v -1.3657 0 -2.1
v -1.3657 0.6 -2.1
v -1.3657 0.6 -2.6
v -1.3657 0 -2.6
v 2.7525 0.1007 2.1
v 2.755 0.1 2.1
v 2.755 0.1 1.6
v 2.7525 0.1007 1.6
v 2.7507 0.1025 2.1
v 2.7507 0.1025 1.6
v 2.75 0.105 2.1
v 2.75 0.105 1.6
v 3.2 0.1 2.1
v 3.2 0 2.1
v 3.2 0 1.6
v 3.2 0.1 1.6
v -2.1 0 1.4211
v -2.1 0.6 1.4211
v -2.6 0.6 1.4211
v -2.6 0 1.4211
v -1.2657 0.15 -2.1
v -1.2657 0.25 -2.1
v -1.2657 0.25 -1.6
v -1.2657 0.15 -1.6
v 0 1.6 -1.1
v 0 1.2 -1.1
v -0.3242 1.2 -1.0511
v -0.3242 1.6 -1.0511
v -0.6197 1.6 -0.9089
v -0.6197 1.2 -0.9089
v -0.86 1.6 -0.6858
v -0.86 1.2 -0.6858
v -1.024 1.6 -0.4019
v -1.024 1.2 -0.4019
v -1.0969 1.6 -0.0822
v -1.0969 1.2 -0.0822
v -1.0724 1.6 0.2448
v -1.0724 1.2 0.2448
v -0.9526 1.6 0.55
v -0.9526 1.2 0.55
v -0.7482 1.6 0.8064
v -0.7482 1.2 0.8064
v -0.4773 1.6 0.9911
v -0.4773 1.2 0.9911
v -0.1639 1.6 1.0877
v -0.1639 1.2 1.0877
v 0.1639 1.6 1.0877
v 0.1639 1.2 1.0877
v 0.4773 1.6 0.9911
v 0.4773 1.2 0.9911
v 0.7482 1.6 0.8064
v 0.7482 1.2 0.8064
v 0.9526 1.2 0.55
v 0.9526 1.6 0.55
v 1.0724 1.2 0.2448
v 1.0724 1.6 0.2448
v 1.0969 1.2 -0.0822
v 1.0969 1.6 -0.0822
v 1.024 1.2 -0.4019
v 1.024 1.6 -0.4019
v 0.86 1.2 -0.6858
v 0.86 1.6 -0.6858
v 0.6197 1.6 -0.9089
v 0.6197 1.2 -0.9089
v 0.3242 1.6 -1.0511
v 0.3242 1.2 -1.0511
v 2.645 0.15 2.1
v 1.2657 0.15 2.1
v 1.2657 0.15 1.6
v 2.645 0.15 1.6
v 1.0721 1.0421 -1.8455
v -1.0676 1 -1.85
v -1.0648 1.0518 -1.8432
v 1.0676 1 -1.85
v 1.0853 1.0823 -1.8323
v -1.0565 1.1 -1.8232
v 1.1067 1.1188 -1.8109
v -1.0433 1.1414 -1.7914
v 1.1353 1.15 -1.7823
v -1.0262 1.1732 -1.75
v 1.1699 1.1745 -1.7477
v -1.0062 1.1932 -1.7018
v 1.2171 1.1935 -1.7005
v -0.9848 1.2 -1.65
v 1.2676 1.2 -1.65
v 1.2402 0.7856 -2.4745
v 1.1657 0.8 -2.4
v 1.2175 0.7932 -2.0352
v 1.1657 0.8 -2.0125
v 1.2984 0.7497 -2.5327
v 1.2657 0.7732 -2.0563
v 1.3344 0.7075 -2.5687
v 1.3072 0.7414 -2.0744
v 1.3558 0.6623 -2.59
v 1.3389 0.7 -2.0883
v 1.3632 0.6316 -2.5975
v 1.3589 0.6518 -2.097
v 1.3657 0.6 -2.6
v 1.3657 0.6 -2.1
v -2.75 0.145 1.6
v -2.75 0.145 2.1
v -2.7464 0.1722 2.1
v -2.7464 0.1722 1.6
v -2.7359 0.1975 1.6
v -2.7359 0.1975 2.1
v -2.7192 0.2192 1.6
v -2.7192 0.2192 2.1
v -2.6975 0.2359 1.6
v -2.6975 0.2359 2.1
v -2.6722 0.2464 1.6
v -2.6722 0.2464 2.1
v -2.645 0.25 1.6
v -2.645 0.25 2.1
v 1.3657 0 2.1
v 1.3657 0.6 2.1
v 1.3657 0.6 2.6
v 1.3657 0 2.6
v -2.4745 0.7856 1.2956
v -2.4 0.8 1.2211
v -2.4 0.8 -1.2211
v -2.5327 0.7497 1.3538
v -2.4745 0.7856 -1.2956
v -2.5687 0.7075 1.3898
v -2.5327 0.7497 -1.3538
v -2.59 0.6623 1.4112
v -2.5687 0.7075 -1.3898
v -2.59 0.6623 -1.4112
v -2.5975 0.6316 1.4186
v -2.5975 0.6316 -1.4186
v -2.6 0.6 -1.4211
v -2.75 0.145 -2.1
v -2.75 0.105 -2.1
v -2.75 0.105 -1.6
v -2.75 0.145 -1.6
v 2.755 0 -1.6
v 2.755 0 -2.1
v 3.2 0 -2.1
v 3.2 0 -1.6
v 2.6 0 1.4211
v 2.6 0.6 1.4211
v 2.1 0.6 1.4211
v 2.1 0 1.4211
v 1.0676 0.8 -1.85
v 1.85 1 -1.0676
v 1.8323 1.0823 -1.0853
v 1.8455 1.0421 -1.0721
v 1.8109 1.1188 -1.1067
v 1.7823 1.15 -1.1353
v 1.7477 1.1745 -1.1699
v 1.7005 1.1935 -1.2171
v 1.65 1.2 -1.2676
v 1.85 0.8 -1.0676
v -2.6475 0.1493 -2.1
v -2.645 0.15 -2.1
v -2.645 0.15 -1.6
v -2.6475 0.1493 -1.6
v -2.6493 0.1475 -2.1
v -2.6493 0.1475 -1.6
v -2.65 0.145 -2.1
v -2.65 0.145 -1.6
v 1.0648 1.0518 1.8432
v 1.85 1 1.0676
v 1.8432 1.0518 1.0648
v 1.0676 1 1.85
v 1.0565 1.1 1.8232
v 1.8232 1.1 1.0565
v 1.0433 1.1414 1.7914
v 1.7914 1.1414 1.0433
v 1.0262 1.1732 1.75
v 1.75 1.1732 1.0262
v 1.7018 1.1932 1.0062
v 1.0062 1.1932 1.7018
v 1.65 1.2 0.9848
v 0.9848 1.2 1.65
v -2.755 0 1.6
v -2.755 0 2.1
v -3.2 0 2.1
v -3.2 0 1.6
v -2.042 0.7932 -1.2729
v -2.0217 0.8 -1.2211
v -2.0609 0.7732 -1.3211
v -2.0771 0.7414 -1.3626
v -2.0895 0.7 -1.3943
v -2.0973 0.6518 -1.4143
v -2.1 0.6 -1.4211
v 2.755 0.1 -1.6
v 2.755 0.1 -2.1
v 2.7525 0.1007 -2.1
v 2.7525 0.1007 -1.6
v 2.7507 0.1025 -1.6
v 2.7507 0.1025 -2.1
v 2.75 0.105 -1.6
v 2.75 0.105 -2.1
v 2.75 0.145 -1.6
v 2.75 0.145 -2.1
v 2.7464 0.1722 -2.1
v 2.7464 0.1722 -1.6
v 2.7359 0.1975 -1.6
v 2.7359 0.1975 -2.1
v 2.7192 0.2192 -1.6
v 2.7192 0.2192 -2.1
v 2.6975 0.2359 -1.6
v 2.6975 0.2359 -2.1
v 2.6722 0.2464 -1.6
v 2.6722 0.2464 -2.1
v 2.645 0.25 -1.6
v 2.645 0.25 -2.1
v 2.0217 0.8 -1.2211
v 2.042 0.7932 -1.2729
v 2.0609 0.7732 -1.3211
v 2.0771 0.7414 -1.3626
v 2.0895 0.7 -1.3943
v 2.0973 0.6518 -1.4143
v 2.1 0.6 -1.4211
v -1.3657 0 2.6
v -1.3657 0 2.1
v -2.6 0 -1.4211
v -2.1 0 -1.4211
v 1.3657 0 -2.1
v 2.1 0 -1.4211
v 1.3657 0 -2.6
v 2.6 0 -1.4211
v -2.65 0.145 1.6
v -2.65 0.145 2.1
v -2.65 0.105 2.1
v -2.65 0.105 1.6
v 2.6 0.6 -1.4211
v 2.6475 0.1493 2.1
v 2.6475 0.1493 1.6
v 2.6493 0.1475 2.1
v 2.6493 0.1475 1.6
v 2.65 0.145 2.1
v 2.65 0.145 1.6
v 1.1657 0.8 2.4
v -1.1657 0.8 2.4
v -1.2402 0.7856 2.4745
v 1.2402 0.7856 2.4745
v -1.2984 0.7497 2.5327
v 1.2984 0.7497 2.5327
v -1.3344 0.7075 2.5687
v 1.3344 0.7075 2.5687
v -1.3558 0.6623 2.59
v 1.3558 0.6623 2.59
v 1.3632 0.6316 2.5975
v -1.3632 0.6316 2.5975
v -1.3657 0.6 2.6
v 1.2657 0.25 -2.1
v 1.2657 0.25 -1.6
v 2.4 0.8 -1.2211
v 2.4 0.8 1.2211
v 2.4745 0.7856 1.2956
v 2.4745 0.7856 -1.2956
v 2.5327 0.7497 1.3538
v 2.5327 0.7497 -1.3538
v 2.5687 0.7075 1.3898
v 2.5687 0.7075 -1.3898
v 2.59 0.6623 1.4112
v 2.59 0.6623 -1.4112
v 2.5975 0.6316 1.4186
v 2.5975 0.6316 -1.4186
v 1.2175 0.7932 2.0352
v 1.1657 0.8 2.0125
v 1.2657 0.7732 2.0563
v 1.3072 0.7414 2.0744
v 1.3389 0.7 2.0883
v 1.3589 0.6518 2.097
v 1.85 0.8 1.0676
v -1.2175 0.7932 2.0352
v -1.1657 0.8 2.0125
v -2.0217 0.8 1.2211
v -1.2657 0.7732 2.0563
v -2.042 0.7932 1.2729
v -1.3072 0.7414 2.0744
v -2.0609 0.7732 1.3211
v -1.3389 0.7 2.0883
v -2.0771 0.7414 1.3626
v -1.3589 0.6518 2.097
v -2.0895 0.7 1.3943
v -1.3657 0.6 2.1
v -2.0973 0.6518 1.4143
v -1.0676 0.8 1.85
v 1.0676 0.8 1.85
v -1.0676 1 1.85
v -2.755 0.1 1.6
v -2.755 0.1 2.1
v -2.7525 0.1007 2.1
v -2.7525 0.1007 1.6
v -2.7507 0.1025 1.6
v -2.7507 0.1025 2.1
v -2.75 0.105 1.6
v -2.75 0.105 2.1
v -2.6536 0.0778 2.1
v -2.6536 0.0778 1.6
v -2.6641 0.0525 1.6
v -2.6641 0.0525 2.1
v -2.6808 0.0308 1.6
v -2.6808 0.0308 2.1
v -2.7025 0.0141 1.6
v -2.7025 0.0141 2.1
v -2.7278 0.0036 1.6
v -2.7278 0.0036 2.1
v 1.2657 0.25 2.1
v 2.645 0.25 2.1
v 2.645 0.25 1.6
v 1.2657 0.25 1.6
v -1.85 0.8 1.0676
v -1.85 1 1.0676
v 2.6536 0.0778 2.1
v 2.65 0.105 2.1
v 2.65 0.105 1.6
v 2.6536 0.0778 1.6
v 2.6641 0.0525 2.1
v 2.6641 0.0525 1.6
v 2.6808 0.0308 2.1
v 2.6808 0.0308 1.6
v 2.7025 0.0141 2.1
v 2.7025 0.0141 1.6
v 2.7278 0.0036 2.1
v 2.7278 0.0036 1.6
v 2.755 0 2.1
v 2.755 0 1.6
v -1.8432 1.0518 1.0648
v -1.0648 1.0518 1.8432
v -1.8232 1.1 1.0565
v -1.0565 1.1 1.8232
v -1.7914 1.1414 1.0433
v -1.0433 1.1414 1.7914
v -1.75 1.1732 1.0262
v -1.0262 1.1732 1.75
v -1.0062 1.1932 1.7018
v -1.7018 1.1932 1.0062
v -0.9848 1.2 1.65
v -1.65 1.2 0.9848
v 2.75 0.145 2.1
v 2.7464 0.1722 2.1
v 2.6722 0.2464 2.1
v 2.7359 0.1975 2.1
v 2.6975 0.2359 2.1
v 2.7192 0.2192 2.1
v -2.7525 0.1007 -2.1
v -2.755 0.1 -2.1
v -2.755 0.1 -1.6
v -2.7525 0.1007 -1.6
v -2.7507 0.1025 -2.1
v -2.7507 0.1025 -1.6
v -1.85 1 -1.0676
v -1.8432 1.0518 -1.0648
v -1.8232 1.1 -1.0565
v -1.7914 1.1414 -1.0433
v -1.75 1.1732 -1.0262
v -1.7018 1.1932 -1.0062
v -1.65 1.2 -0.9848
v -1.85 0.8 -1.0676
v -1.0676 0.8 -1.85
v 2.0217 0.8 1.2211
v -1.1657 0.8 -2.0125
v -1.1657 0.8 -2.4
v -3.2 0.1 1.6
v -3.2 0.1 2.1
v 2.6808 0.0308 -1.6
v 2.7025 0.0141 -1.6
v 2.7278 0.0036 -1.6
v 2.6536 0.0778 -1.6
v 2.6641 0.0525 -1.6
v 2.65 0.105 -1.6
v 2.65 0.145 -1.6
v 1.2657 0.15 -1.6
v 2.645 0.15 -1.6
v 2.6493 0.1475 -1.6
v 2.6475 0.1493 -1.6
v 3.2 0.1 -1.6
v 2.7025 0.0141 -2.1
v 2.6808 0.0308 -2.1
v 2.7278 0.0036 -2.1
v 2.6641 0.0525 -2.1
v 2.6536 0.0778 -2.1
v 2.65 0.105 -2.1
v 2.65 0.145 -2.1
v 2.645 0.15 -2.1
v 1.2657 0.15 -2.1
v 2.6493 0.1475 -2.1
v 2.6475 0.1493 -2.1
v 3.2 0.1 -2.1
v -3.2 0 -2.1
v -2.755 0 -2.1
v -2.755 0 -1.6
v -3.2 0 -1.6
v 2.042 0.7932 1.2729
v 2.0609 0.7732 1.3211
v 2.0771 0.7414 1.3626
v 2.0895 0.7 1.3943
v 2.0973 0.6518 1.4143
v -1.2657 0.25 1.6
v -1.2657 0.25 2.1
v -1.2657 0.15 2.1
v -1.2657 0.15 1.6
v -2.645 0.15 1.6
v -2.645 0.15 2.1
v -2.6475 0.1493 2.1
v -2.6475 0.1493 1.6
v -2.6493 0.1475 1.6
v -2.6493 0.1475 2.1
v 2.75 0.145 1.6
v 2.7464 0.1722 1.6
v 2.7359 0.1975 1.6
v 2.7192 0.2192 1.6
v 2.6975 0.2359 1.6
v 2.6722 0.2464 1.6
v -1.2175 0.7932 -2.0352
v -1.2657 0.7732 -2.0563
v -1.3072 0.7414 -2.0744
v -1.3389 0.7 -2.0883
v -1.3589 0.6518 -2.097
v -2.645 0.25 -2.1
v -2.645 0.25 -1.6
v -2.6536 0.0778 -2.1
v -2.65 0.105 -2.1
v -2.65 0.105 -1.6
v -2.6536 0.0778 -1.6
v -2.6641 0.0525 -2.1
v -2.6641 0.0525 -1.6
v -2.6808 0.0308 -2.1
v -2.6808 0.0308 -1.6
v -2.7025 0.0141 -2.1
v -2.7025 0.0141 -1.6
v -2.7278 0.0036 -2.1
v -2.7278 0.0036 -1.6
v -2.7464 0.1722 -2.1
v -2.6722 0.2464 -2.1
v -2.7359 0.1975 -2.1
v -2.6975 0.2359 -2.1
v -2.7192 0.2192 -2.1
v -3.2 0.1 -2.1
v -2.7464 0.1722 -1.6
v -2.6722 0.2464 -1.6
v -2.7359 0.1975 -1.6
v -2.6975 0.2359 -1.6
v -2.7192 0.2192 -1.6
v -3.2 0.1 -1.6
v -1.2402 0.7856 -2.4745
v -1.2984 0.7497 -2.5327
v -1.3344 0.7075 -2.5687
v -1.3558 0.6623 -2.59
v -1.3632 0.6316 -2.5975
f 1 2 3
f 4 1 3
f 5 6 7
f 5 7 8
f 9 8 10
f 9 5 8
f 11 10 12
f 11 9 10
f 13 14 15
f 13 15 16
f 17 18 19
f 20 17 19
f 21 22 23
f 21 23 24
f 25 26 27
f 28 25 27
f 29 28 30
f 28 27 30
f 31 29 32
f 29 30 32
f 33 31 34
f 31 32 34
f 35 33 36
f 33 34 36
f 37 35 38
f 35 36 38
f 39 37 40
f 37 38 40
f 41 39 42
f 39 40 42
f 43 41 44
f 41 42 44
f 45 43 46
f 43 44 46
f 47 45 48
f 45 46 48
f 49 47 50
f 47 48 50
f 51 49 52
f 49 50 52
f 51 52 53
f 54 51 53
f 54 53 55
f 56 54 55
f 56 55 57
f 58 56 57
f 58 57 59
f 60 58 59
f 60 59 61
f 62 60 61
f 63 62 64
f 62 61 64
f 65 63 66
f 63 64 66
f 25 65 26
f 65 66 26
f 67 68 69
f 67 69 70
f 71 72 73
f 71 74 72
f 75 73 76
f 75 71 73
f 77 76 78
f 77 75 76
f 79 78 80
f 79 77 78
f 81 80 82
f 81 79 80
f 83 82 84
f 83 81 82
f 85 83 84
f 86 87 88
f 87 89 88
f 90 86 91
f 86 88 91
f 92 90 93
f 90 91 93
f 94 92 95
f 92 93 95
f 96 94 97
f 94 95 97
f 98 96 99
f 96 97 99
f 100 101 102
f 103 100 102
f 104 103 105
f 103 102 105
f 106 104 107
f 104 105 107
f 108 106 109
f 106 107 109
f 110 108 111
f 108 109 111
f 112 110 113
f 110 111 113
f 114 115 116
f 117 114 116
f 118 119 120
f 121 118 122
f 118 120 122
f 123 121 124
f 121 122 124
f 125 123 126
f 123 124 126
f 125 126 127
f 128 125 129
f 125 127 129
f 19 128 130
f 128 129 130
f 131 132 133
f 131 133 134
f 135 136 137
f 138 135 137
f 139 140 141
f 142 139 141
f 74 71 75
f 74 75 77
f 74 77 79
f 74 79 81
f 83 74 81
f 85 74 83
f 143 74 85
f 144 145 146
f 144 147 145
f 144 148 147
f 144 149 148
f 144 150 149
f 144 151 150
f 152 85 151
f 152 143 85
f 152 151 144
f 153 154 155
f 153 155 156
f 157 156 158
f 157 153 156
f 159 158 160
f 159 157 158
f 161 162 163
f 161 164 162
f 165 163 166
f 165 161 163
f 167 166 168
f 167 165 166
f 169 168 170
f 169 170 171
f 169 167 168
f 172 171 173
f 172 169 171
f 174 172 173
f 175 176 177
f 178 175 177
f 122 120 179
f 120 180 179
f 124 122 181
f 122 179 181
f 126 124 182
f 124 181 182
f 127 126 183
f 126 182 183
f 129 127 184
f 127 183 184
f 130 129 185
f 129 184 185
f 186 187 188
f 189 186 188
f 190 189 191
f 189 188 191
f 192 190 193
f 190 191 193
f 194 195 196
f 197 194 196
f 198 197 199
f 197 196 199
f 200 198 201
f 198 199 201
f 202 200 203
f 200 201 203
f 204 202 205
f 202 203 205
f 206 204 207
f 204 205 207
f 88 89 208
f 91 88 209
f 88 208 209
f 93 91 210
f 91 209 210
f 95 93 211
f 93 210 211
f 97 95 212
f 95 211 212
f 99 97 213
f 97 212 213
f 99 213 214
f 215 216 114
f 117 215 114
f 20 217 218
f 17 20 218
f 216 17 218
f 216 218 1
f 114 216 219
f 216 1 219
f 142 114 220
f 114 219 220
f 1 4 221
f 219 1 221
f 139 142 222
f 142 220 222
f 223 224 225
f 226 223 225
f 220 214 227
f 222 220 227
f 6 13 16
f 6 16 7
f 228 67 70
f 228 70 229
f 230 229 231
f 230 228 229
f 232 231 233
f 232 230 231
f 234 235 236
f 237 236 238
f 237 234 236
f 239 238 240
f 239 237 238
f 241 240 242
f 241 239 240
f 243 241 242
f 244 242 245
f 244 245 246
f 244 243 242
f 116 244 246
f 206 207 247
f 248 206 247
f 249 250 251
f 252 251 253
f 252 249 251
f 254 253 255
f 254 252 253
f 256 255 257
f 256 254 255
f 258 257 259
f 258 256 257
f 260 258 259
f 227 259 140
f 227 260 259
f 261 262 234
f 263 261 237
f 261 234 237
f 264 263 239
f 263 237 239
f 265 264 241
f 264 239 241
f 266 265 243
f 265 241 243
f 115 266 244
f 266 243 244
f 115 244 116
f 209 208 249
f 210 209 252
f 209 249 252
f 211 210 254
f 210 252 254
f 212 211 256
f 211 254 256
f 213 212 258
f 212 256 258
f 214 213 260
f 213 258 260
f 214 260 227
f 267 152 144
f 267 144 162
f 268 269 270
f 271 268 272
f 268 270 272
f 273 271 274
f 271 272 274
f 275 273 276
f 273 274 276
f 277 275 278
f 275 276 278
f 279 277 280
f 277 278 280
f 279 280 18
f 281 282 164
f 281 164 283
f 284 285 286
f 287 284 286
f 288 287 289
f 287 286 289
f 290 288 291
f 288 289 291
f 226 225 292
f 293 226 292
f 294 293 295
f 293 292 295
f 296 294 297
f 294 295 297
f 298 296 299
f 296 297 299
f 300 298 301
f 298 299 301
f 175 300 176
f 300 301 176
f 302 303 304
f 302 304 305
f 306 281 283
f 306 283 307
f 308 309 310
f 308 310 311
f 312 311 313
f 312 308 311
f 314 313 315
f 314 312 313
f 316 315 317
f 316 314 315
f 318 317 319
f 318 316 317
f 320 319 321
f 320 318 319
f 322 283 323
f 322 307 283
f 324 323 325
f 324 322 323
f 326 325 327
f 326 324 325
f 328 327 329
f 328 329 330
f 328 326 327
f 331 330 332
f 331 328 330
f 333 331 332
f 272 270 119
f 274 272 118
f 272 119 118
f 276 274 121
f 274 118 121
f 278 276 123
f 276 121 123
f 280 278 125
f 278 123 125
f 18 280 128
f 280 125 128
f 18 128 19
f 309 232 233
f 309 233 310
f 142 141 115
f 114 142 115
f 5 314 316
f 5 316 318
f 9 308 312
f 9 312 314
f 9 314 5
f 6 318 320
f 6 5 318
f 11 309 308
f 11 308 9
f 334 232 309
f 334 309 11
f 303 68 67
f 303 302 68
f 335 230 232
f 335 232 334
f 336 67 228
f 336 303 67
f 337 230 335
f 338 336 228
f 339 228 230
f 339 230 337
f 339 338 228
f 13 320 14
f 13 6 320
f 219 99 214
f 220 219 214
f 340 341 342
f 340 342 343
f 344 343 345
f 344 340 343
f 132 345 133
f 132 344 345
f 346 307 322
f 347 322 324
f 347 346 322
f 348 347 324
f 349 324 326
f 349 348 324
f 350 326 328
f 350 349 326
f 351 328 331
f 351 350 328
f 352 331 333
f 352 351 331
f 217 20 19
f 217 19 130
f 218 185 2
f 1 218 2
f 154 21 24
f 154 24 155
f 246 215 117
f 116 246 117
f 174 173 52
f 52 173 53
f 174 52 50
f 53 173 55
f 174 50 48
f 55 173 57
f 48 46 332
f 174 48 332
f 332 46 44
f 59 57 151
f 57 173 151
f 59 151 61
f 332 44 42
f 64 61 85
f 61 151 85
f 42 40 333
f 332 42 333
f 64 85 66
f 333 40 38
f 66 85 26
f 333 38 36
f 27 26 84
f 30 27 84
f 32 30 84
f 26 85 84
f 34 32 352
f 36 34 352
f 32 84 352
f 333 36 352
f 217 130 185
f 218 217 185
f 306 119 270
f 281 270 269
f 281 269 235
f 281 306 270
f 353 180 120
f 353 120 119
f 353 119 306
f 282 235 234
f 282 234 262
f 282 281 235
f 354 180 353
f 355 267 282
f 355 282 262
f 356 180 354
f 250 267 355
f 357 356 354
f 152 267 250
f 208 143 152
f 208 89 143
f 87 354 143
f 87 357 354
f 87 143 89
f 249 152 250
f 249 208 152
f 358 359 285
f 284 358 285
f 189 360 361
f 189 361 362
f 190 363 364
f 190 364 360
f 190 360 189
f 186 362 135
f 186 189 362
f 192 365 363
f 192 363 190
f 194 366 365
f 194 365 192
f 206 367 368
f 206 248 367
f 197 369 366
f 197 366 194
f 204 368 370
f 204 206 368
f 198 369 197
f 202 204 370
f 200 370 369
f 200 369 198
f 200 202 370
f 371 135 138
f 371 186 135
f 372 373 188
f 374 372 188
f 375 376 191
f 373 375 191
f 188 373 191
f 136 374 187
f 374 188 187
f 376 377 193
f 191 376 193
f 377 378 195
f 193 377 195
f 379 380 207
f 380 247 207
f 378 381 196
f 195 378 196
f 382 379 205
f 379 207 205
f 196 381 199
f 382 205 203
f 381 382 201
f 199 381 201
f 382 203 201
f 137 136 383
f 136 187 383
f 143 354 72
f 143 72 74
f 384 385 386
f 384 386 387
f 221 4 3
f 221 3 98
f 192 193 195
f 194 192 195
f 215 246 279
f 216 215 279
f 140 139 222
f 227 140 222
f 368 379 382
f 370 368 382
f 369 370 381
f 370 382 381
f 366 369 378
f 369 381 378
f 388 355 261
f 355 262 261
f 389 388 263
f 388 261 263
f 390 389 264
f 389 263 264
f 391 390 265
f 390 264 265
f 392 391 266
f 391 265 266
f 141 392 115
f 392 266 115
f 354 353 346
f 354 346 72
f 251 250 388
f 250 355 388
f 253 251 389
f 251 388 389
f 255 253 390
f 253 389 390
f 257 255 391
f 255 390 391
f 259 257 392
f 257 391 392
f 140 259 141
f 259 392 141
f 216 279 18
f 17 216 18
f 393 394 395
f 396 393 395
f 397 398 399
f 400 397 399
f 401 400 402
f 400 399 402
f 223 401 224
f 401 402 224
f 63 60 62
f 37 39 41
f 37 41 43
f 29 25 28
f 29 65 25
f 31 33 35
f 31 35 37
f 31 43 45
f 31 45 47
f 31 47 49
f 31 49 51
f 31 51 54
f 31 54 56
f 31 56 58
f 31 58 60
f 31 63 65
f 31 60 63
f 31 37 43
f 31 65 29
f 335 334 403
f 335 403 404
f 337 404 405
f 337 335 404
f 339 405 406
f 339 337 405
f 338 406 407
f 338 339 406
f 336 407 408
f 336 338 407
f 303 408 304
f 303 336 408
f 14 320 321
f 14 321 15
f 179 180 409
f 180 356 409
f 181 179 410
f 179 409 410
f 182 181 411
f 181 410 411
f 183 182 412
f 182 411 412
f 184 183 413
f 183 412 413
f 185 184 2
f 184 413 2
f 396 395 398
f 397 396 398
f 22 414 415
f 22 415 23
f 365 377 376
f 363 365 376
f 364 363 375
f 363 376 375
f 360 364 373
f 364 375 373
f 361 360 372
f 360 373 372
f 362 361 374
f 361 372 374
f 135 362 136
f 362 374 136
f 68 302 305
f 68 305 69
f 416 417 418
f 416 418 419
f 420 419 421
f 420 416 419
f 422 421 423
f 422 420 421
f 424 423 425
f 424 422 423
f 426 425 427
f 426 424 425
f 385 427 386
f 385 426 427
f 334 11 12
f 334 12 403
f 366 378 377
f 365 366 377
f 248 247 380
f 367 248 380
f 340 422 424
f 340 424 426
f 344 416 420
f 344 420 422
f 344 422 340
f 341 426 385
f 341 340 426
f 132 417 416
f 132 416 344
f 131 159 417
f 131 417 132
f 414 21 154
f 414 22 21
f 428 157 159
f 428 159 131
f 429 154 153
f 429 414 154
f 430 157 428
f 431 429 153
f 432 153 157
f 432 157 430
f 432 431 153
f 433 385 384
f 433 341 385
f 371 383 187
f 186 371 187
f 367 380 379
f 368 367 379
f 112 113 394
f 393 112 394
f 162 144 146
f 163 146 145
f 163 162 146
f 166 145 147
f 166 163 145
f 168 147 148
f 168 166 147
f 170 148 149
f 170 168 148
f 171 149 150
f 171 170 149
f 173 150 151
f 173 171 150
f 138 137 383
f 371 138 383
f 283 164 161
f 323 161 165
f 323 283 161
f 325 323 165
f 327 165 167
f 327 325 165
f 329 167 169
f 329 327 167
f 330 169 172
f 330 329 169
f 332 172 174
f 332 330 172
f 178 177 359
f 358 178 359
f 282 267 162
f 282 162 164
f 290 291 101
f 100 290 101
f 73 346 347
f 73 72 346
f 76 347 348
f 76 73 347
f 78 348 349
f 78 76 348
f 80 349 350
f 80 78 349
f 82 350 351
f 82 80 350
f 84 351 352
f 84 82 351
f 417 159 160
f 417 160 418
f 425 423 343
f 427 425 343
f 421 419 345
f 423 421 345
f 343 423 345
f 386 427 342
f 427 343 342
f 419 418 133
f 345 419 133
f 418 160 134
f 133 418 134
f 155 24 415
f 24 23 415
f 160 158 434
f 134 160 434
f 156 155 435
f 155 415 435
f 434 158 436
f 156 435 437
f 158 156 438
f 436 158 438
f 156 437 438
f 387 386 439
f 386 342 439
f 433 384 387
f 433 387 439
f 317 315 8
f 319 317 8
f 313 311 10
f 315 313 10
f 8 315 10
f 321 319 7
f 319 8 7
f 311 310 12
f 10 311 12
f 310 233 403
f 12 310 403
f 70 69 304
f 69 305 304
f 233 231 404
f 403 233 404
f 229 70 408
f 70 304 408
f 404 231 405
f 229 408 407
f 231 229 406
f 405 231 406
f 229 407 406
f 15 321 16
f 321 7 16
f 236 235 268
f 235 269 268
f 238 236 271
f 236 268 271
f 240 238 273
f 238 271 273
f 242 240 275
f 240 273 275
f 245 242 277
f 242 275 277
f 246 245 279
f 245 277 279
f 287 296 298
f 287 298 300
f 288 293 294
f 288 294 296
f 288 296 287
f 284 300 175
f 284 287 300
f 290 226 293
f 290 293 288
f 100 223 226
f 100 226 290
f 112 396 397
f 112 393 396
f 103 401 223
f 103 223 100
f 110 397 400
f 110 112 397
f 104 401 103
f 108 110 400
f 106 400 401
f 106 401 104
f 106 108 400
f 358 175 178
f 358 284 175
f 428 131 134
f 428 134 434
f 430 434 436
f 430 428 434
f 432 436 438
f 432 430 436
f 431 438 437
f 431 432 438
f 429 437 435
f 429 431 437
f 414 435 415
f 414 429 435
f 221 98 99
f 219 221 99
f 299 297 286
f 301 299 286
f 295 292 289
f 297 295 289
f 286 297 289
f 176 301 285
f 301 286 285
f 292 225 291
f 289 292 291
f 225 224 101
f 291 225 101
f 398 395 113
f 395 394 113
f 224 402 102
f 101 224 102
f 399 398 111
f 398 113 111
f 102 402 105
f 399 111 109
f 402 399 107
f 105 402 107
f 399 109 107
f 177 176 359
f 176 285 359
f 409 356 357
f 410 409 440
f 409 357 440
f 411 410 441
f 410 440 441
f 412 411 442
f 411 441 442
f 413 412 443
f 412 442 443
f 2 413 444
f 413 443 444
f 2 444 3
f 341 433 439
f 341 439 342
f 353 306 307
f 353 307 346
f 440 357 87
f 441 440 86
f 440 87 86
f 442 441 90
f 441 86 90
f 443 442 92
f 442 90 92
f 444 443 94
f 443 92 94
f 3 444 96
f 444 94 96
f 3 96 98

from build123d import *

# Parameters (mm, degrees)
SKETCH1_W               = 5.2
SKETCH1_H               = 5.2
BOSS_EXTRUDE1_DEPTH     = 0.8
BOSS_EXTRUDE2_DEPTH     = 0.4
SKETCH3_R               = 1.1
BOSS_EXTRUDE3_DEPTH     = 0.4
CUT_EXTRUDE1_DEPTH      = 4.762977544
BASE_FLANGE1_DEPTH      = 0.25
BASE_FLANGE1_DEPTH_BACK = 0.25
FILLET1_R               = 0.2
FILLET2_R               = 0.2


# Sheet-metal steps are written as plain solids
with BuildPart() as part:
    # Sketch1 → Boss-Extrude1 (new body)
    with BuildSketch(Plane(origin=(0, 0, 0), x_dir=(1, 0, 0), z_dir=(0, 1, 0))):
        Rectangle(SKETCH1_W, SKETCH1_H)
    extrude(amount=BOSS_EXTRUDE1_DEPTH)

    # Sketch2 → Boss-Extrude2 (add)
    with BuildSketch(Plane(origin=(0, 0.8, 0), x_dir=(1, 0, 0), z_dir=(0, 1, 0))):
        Polygon((-1.067602847, 1.85), (1.067602847, 1.85), (1.85, 1.067602847), (1.85, -1.067602847), (1.067602847, -1.85), (-1.067602847, -1.85), (-1.85, -1.067602847), (-1.85, 1.067602847), align=None)
    extrude(amount=BOSS_EXTRUDE2_DEPTH)

    # Sketch3 → Boss-Extrude3 (add)
    with BuildSketch(Plane(origin=(0, 1.2, 0), x_dir=(1, 0, 0), z_dir=(0, 1, 0))):
        with Locations(Location((0, 0, 0), (0, 0, 90))):
            Circle(SKETCH3_R)
    extrude(amount=BOSS_EXTRUDE3_DEPTH)

    # Sketch4 → Cut-Extrude1 (cut, through all)
    with BuildSketch(Plane(origin=(0, 0.8, 0), x_dir=(1, 0, 0), z_dir=(0, 1, 0))):
        Polygon((2.6, 2.6), (1.365741231, 2.6), (1.365741231, 2.1), (2.1, 1.421130307), (2.6, 1.421130307), align=None)
        Polygon((-1.365741231, 2.1), (-1.365741231, 2.6), (-2.6, 2.6), (-2.6, 1.421130307), (-2.1, 1.421130307), align=None)
        Polygon((-2.1, -1.421130307), (-2.6, -1.421130307), (-2.6, -2.6), (-1.365741231, -2.6), (-1.365741231, -2.1), align=None)
        Polygon((2.6, -2.6), (2.6, -1.421130307), (2.1, -1.421130307), (1.365741231, -2.1), (1.365741231, -2.6), align=None)
    extrude(amount=-CUT_EXTRUDE1_DEPTH, mode=Mode.SUBTRACT)

    # Fillet1
    fillet1_edges = [part.edges().sort_by_distance(p)[0] for p in [
        (-1.458801424, 1.2, -1.458801424),
        (-1.85, 1.2, 0),
        (-1.458801424, 1.2, 1.458801424),
        (0, 1.2, 1.85),
        (1.458801424, 1.2, 1.458801424),
        (1.85, 1.2, 0),
        (0, 1.2, -1.85),
    ]]
    fillet(fillet1_edges, radius=FILLET1_R)

    # Fillet2
    fillet2_edges = [part.edges().sort_by_distance(p)[0] for p in [
        (0, 0.8, -2.6),
        (1.365741231, 0.8, -2.35),
        (1.732870615, 0.8, -1.760565154),
        (2.35, 0.8, -1.421130307),
        (-2.6, 0.8, 0),
        (-2.35, 0.8, -1.421130307),
        (-1.365741231, 0.8, -2.35),
        (-1.732870615, 0.8, -1.760565154),
        (0, 0.8, 2.6),
        (-1.365741231, 0.8, 2.35),
        (-1.732870615, 0.8, 1.760565154),
        (-2.35, 0.8, 1.421130307),
        (2.6, 0.8, 0),
        (2.35, 0.8, 1.421130307),
        (1.365741231, 0.8, 2.35),
        (1.732870615, 0.8, 1.760565154),
    ]]
    fillet(fillet2_edges, radius=FILLET2_R)


with BuildPart() as body_2:
    # Sketch5 → Base-Flange1 (new, two sides: drawn at the far end of the back side and taken through both)
    with BuildSketch(Plane(origin=(0, 0, 1.85), x_dir=(-1, 0, 0), z_dir=(0, 0, -1)).offset(-BASE_FLANGE1_DEPTH_BACK)):
        with BuildLine():
            Line((-1.265741231, 0.15), (-2.645, 0.15))
            ThreePointArc((-2.645, 0.15), (-2.648535534, 0.148535534), (-2.65, 0.145))
            Line((-2.65, 0.145), (-2.65, 0.105))
            ThreePointArc((-2.65, 0.105), (-2.680753788, 0.030753788), (-2.755, 0))
            Line((-2.755, 0), (-3.2, 0))
            Line((-3.2, 0), (-3.2, 0.1))
            Line((-3.2, 0.1), (-2.755, 0.1))
            ThreePointArc((-2.755, 0.1), (-2.751464466, 0.101464466), (-2.75, 0.105))
            Line((-2.75, 0.105), (-2.75, 0.145))
            ThreePointArc((-2.75, 0.145), (-2.719246212, 0.219246212), (-2.645, 0.25))
            Line((-2.645, 0.25), (-1.265741231, 0.25))
            Line((-1.265741231, 0.25), (-1.265741231, 0.15))
        make_face()
    extrude(amount=BASE_FLANGE1_DEPTH + BASE_FLANGE1_DEPTH_BACK)


with BuildPart() as body_3:
    # Mirror1: mirrored copy
    add(body_2.part.mirror(Plane.ZY))


with BuildPart() as body_4:
    # Mirror2: mirrored copy
    add(body_3.part.mirror(Plane(origin=(0, 0, 0), x_dir=(1, 0, 0), z_dir=(0, 0, -1))))


with BuildPart() as body_5:
    # Mirror2 2: mirrored copy
    add(body_2.part.mirror(Plane(origin=(0, 0, 0), x_dir=(1, 0, 0), z_dir=(0, 0, -1))))


solid = Compound([part.part, body_2.part, body_3.part, body_4.part, body_5.part])
